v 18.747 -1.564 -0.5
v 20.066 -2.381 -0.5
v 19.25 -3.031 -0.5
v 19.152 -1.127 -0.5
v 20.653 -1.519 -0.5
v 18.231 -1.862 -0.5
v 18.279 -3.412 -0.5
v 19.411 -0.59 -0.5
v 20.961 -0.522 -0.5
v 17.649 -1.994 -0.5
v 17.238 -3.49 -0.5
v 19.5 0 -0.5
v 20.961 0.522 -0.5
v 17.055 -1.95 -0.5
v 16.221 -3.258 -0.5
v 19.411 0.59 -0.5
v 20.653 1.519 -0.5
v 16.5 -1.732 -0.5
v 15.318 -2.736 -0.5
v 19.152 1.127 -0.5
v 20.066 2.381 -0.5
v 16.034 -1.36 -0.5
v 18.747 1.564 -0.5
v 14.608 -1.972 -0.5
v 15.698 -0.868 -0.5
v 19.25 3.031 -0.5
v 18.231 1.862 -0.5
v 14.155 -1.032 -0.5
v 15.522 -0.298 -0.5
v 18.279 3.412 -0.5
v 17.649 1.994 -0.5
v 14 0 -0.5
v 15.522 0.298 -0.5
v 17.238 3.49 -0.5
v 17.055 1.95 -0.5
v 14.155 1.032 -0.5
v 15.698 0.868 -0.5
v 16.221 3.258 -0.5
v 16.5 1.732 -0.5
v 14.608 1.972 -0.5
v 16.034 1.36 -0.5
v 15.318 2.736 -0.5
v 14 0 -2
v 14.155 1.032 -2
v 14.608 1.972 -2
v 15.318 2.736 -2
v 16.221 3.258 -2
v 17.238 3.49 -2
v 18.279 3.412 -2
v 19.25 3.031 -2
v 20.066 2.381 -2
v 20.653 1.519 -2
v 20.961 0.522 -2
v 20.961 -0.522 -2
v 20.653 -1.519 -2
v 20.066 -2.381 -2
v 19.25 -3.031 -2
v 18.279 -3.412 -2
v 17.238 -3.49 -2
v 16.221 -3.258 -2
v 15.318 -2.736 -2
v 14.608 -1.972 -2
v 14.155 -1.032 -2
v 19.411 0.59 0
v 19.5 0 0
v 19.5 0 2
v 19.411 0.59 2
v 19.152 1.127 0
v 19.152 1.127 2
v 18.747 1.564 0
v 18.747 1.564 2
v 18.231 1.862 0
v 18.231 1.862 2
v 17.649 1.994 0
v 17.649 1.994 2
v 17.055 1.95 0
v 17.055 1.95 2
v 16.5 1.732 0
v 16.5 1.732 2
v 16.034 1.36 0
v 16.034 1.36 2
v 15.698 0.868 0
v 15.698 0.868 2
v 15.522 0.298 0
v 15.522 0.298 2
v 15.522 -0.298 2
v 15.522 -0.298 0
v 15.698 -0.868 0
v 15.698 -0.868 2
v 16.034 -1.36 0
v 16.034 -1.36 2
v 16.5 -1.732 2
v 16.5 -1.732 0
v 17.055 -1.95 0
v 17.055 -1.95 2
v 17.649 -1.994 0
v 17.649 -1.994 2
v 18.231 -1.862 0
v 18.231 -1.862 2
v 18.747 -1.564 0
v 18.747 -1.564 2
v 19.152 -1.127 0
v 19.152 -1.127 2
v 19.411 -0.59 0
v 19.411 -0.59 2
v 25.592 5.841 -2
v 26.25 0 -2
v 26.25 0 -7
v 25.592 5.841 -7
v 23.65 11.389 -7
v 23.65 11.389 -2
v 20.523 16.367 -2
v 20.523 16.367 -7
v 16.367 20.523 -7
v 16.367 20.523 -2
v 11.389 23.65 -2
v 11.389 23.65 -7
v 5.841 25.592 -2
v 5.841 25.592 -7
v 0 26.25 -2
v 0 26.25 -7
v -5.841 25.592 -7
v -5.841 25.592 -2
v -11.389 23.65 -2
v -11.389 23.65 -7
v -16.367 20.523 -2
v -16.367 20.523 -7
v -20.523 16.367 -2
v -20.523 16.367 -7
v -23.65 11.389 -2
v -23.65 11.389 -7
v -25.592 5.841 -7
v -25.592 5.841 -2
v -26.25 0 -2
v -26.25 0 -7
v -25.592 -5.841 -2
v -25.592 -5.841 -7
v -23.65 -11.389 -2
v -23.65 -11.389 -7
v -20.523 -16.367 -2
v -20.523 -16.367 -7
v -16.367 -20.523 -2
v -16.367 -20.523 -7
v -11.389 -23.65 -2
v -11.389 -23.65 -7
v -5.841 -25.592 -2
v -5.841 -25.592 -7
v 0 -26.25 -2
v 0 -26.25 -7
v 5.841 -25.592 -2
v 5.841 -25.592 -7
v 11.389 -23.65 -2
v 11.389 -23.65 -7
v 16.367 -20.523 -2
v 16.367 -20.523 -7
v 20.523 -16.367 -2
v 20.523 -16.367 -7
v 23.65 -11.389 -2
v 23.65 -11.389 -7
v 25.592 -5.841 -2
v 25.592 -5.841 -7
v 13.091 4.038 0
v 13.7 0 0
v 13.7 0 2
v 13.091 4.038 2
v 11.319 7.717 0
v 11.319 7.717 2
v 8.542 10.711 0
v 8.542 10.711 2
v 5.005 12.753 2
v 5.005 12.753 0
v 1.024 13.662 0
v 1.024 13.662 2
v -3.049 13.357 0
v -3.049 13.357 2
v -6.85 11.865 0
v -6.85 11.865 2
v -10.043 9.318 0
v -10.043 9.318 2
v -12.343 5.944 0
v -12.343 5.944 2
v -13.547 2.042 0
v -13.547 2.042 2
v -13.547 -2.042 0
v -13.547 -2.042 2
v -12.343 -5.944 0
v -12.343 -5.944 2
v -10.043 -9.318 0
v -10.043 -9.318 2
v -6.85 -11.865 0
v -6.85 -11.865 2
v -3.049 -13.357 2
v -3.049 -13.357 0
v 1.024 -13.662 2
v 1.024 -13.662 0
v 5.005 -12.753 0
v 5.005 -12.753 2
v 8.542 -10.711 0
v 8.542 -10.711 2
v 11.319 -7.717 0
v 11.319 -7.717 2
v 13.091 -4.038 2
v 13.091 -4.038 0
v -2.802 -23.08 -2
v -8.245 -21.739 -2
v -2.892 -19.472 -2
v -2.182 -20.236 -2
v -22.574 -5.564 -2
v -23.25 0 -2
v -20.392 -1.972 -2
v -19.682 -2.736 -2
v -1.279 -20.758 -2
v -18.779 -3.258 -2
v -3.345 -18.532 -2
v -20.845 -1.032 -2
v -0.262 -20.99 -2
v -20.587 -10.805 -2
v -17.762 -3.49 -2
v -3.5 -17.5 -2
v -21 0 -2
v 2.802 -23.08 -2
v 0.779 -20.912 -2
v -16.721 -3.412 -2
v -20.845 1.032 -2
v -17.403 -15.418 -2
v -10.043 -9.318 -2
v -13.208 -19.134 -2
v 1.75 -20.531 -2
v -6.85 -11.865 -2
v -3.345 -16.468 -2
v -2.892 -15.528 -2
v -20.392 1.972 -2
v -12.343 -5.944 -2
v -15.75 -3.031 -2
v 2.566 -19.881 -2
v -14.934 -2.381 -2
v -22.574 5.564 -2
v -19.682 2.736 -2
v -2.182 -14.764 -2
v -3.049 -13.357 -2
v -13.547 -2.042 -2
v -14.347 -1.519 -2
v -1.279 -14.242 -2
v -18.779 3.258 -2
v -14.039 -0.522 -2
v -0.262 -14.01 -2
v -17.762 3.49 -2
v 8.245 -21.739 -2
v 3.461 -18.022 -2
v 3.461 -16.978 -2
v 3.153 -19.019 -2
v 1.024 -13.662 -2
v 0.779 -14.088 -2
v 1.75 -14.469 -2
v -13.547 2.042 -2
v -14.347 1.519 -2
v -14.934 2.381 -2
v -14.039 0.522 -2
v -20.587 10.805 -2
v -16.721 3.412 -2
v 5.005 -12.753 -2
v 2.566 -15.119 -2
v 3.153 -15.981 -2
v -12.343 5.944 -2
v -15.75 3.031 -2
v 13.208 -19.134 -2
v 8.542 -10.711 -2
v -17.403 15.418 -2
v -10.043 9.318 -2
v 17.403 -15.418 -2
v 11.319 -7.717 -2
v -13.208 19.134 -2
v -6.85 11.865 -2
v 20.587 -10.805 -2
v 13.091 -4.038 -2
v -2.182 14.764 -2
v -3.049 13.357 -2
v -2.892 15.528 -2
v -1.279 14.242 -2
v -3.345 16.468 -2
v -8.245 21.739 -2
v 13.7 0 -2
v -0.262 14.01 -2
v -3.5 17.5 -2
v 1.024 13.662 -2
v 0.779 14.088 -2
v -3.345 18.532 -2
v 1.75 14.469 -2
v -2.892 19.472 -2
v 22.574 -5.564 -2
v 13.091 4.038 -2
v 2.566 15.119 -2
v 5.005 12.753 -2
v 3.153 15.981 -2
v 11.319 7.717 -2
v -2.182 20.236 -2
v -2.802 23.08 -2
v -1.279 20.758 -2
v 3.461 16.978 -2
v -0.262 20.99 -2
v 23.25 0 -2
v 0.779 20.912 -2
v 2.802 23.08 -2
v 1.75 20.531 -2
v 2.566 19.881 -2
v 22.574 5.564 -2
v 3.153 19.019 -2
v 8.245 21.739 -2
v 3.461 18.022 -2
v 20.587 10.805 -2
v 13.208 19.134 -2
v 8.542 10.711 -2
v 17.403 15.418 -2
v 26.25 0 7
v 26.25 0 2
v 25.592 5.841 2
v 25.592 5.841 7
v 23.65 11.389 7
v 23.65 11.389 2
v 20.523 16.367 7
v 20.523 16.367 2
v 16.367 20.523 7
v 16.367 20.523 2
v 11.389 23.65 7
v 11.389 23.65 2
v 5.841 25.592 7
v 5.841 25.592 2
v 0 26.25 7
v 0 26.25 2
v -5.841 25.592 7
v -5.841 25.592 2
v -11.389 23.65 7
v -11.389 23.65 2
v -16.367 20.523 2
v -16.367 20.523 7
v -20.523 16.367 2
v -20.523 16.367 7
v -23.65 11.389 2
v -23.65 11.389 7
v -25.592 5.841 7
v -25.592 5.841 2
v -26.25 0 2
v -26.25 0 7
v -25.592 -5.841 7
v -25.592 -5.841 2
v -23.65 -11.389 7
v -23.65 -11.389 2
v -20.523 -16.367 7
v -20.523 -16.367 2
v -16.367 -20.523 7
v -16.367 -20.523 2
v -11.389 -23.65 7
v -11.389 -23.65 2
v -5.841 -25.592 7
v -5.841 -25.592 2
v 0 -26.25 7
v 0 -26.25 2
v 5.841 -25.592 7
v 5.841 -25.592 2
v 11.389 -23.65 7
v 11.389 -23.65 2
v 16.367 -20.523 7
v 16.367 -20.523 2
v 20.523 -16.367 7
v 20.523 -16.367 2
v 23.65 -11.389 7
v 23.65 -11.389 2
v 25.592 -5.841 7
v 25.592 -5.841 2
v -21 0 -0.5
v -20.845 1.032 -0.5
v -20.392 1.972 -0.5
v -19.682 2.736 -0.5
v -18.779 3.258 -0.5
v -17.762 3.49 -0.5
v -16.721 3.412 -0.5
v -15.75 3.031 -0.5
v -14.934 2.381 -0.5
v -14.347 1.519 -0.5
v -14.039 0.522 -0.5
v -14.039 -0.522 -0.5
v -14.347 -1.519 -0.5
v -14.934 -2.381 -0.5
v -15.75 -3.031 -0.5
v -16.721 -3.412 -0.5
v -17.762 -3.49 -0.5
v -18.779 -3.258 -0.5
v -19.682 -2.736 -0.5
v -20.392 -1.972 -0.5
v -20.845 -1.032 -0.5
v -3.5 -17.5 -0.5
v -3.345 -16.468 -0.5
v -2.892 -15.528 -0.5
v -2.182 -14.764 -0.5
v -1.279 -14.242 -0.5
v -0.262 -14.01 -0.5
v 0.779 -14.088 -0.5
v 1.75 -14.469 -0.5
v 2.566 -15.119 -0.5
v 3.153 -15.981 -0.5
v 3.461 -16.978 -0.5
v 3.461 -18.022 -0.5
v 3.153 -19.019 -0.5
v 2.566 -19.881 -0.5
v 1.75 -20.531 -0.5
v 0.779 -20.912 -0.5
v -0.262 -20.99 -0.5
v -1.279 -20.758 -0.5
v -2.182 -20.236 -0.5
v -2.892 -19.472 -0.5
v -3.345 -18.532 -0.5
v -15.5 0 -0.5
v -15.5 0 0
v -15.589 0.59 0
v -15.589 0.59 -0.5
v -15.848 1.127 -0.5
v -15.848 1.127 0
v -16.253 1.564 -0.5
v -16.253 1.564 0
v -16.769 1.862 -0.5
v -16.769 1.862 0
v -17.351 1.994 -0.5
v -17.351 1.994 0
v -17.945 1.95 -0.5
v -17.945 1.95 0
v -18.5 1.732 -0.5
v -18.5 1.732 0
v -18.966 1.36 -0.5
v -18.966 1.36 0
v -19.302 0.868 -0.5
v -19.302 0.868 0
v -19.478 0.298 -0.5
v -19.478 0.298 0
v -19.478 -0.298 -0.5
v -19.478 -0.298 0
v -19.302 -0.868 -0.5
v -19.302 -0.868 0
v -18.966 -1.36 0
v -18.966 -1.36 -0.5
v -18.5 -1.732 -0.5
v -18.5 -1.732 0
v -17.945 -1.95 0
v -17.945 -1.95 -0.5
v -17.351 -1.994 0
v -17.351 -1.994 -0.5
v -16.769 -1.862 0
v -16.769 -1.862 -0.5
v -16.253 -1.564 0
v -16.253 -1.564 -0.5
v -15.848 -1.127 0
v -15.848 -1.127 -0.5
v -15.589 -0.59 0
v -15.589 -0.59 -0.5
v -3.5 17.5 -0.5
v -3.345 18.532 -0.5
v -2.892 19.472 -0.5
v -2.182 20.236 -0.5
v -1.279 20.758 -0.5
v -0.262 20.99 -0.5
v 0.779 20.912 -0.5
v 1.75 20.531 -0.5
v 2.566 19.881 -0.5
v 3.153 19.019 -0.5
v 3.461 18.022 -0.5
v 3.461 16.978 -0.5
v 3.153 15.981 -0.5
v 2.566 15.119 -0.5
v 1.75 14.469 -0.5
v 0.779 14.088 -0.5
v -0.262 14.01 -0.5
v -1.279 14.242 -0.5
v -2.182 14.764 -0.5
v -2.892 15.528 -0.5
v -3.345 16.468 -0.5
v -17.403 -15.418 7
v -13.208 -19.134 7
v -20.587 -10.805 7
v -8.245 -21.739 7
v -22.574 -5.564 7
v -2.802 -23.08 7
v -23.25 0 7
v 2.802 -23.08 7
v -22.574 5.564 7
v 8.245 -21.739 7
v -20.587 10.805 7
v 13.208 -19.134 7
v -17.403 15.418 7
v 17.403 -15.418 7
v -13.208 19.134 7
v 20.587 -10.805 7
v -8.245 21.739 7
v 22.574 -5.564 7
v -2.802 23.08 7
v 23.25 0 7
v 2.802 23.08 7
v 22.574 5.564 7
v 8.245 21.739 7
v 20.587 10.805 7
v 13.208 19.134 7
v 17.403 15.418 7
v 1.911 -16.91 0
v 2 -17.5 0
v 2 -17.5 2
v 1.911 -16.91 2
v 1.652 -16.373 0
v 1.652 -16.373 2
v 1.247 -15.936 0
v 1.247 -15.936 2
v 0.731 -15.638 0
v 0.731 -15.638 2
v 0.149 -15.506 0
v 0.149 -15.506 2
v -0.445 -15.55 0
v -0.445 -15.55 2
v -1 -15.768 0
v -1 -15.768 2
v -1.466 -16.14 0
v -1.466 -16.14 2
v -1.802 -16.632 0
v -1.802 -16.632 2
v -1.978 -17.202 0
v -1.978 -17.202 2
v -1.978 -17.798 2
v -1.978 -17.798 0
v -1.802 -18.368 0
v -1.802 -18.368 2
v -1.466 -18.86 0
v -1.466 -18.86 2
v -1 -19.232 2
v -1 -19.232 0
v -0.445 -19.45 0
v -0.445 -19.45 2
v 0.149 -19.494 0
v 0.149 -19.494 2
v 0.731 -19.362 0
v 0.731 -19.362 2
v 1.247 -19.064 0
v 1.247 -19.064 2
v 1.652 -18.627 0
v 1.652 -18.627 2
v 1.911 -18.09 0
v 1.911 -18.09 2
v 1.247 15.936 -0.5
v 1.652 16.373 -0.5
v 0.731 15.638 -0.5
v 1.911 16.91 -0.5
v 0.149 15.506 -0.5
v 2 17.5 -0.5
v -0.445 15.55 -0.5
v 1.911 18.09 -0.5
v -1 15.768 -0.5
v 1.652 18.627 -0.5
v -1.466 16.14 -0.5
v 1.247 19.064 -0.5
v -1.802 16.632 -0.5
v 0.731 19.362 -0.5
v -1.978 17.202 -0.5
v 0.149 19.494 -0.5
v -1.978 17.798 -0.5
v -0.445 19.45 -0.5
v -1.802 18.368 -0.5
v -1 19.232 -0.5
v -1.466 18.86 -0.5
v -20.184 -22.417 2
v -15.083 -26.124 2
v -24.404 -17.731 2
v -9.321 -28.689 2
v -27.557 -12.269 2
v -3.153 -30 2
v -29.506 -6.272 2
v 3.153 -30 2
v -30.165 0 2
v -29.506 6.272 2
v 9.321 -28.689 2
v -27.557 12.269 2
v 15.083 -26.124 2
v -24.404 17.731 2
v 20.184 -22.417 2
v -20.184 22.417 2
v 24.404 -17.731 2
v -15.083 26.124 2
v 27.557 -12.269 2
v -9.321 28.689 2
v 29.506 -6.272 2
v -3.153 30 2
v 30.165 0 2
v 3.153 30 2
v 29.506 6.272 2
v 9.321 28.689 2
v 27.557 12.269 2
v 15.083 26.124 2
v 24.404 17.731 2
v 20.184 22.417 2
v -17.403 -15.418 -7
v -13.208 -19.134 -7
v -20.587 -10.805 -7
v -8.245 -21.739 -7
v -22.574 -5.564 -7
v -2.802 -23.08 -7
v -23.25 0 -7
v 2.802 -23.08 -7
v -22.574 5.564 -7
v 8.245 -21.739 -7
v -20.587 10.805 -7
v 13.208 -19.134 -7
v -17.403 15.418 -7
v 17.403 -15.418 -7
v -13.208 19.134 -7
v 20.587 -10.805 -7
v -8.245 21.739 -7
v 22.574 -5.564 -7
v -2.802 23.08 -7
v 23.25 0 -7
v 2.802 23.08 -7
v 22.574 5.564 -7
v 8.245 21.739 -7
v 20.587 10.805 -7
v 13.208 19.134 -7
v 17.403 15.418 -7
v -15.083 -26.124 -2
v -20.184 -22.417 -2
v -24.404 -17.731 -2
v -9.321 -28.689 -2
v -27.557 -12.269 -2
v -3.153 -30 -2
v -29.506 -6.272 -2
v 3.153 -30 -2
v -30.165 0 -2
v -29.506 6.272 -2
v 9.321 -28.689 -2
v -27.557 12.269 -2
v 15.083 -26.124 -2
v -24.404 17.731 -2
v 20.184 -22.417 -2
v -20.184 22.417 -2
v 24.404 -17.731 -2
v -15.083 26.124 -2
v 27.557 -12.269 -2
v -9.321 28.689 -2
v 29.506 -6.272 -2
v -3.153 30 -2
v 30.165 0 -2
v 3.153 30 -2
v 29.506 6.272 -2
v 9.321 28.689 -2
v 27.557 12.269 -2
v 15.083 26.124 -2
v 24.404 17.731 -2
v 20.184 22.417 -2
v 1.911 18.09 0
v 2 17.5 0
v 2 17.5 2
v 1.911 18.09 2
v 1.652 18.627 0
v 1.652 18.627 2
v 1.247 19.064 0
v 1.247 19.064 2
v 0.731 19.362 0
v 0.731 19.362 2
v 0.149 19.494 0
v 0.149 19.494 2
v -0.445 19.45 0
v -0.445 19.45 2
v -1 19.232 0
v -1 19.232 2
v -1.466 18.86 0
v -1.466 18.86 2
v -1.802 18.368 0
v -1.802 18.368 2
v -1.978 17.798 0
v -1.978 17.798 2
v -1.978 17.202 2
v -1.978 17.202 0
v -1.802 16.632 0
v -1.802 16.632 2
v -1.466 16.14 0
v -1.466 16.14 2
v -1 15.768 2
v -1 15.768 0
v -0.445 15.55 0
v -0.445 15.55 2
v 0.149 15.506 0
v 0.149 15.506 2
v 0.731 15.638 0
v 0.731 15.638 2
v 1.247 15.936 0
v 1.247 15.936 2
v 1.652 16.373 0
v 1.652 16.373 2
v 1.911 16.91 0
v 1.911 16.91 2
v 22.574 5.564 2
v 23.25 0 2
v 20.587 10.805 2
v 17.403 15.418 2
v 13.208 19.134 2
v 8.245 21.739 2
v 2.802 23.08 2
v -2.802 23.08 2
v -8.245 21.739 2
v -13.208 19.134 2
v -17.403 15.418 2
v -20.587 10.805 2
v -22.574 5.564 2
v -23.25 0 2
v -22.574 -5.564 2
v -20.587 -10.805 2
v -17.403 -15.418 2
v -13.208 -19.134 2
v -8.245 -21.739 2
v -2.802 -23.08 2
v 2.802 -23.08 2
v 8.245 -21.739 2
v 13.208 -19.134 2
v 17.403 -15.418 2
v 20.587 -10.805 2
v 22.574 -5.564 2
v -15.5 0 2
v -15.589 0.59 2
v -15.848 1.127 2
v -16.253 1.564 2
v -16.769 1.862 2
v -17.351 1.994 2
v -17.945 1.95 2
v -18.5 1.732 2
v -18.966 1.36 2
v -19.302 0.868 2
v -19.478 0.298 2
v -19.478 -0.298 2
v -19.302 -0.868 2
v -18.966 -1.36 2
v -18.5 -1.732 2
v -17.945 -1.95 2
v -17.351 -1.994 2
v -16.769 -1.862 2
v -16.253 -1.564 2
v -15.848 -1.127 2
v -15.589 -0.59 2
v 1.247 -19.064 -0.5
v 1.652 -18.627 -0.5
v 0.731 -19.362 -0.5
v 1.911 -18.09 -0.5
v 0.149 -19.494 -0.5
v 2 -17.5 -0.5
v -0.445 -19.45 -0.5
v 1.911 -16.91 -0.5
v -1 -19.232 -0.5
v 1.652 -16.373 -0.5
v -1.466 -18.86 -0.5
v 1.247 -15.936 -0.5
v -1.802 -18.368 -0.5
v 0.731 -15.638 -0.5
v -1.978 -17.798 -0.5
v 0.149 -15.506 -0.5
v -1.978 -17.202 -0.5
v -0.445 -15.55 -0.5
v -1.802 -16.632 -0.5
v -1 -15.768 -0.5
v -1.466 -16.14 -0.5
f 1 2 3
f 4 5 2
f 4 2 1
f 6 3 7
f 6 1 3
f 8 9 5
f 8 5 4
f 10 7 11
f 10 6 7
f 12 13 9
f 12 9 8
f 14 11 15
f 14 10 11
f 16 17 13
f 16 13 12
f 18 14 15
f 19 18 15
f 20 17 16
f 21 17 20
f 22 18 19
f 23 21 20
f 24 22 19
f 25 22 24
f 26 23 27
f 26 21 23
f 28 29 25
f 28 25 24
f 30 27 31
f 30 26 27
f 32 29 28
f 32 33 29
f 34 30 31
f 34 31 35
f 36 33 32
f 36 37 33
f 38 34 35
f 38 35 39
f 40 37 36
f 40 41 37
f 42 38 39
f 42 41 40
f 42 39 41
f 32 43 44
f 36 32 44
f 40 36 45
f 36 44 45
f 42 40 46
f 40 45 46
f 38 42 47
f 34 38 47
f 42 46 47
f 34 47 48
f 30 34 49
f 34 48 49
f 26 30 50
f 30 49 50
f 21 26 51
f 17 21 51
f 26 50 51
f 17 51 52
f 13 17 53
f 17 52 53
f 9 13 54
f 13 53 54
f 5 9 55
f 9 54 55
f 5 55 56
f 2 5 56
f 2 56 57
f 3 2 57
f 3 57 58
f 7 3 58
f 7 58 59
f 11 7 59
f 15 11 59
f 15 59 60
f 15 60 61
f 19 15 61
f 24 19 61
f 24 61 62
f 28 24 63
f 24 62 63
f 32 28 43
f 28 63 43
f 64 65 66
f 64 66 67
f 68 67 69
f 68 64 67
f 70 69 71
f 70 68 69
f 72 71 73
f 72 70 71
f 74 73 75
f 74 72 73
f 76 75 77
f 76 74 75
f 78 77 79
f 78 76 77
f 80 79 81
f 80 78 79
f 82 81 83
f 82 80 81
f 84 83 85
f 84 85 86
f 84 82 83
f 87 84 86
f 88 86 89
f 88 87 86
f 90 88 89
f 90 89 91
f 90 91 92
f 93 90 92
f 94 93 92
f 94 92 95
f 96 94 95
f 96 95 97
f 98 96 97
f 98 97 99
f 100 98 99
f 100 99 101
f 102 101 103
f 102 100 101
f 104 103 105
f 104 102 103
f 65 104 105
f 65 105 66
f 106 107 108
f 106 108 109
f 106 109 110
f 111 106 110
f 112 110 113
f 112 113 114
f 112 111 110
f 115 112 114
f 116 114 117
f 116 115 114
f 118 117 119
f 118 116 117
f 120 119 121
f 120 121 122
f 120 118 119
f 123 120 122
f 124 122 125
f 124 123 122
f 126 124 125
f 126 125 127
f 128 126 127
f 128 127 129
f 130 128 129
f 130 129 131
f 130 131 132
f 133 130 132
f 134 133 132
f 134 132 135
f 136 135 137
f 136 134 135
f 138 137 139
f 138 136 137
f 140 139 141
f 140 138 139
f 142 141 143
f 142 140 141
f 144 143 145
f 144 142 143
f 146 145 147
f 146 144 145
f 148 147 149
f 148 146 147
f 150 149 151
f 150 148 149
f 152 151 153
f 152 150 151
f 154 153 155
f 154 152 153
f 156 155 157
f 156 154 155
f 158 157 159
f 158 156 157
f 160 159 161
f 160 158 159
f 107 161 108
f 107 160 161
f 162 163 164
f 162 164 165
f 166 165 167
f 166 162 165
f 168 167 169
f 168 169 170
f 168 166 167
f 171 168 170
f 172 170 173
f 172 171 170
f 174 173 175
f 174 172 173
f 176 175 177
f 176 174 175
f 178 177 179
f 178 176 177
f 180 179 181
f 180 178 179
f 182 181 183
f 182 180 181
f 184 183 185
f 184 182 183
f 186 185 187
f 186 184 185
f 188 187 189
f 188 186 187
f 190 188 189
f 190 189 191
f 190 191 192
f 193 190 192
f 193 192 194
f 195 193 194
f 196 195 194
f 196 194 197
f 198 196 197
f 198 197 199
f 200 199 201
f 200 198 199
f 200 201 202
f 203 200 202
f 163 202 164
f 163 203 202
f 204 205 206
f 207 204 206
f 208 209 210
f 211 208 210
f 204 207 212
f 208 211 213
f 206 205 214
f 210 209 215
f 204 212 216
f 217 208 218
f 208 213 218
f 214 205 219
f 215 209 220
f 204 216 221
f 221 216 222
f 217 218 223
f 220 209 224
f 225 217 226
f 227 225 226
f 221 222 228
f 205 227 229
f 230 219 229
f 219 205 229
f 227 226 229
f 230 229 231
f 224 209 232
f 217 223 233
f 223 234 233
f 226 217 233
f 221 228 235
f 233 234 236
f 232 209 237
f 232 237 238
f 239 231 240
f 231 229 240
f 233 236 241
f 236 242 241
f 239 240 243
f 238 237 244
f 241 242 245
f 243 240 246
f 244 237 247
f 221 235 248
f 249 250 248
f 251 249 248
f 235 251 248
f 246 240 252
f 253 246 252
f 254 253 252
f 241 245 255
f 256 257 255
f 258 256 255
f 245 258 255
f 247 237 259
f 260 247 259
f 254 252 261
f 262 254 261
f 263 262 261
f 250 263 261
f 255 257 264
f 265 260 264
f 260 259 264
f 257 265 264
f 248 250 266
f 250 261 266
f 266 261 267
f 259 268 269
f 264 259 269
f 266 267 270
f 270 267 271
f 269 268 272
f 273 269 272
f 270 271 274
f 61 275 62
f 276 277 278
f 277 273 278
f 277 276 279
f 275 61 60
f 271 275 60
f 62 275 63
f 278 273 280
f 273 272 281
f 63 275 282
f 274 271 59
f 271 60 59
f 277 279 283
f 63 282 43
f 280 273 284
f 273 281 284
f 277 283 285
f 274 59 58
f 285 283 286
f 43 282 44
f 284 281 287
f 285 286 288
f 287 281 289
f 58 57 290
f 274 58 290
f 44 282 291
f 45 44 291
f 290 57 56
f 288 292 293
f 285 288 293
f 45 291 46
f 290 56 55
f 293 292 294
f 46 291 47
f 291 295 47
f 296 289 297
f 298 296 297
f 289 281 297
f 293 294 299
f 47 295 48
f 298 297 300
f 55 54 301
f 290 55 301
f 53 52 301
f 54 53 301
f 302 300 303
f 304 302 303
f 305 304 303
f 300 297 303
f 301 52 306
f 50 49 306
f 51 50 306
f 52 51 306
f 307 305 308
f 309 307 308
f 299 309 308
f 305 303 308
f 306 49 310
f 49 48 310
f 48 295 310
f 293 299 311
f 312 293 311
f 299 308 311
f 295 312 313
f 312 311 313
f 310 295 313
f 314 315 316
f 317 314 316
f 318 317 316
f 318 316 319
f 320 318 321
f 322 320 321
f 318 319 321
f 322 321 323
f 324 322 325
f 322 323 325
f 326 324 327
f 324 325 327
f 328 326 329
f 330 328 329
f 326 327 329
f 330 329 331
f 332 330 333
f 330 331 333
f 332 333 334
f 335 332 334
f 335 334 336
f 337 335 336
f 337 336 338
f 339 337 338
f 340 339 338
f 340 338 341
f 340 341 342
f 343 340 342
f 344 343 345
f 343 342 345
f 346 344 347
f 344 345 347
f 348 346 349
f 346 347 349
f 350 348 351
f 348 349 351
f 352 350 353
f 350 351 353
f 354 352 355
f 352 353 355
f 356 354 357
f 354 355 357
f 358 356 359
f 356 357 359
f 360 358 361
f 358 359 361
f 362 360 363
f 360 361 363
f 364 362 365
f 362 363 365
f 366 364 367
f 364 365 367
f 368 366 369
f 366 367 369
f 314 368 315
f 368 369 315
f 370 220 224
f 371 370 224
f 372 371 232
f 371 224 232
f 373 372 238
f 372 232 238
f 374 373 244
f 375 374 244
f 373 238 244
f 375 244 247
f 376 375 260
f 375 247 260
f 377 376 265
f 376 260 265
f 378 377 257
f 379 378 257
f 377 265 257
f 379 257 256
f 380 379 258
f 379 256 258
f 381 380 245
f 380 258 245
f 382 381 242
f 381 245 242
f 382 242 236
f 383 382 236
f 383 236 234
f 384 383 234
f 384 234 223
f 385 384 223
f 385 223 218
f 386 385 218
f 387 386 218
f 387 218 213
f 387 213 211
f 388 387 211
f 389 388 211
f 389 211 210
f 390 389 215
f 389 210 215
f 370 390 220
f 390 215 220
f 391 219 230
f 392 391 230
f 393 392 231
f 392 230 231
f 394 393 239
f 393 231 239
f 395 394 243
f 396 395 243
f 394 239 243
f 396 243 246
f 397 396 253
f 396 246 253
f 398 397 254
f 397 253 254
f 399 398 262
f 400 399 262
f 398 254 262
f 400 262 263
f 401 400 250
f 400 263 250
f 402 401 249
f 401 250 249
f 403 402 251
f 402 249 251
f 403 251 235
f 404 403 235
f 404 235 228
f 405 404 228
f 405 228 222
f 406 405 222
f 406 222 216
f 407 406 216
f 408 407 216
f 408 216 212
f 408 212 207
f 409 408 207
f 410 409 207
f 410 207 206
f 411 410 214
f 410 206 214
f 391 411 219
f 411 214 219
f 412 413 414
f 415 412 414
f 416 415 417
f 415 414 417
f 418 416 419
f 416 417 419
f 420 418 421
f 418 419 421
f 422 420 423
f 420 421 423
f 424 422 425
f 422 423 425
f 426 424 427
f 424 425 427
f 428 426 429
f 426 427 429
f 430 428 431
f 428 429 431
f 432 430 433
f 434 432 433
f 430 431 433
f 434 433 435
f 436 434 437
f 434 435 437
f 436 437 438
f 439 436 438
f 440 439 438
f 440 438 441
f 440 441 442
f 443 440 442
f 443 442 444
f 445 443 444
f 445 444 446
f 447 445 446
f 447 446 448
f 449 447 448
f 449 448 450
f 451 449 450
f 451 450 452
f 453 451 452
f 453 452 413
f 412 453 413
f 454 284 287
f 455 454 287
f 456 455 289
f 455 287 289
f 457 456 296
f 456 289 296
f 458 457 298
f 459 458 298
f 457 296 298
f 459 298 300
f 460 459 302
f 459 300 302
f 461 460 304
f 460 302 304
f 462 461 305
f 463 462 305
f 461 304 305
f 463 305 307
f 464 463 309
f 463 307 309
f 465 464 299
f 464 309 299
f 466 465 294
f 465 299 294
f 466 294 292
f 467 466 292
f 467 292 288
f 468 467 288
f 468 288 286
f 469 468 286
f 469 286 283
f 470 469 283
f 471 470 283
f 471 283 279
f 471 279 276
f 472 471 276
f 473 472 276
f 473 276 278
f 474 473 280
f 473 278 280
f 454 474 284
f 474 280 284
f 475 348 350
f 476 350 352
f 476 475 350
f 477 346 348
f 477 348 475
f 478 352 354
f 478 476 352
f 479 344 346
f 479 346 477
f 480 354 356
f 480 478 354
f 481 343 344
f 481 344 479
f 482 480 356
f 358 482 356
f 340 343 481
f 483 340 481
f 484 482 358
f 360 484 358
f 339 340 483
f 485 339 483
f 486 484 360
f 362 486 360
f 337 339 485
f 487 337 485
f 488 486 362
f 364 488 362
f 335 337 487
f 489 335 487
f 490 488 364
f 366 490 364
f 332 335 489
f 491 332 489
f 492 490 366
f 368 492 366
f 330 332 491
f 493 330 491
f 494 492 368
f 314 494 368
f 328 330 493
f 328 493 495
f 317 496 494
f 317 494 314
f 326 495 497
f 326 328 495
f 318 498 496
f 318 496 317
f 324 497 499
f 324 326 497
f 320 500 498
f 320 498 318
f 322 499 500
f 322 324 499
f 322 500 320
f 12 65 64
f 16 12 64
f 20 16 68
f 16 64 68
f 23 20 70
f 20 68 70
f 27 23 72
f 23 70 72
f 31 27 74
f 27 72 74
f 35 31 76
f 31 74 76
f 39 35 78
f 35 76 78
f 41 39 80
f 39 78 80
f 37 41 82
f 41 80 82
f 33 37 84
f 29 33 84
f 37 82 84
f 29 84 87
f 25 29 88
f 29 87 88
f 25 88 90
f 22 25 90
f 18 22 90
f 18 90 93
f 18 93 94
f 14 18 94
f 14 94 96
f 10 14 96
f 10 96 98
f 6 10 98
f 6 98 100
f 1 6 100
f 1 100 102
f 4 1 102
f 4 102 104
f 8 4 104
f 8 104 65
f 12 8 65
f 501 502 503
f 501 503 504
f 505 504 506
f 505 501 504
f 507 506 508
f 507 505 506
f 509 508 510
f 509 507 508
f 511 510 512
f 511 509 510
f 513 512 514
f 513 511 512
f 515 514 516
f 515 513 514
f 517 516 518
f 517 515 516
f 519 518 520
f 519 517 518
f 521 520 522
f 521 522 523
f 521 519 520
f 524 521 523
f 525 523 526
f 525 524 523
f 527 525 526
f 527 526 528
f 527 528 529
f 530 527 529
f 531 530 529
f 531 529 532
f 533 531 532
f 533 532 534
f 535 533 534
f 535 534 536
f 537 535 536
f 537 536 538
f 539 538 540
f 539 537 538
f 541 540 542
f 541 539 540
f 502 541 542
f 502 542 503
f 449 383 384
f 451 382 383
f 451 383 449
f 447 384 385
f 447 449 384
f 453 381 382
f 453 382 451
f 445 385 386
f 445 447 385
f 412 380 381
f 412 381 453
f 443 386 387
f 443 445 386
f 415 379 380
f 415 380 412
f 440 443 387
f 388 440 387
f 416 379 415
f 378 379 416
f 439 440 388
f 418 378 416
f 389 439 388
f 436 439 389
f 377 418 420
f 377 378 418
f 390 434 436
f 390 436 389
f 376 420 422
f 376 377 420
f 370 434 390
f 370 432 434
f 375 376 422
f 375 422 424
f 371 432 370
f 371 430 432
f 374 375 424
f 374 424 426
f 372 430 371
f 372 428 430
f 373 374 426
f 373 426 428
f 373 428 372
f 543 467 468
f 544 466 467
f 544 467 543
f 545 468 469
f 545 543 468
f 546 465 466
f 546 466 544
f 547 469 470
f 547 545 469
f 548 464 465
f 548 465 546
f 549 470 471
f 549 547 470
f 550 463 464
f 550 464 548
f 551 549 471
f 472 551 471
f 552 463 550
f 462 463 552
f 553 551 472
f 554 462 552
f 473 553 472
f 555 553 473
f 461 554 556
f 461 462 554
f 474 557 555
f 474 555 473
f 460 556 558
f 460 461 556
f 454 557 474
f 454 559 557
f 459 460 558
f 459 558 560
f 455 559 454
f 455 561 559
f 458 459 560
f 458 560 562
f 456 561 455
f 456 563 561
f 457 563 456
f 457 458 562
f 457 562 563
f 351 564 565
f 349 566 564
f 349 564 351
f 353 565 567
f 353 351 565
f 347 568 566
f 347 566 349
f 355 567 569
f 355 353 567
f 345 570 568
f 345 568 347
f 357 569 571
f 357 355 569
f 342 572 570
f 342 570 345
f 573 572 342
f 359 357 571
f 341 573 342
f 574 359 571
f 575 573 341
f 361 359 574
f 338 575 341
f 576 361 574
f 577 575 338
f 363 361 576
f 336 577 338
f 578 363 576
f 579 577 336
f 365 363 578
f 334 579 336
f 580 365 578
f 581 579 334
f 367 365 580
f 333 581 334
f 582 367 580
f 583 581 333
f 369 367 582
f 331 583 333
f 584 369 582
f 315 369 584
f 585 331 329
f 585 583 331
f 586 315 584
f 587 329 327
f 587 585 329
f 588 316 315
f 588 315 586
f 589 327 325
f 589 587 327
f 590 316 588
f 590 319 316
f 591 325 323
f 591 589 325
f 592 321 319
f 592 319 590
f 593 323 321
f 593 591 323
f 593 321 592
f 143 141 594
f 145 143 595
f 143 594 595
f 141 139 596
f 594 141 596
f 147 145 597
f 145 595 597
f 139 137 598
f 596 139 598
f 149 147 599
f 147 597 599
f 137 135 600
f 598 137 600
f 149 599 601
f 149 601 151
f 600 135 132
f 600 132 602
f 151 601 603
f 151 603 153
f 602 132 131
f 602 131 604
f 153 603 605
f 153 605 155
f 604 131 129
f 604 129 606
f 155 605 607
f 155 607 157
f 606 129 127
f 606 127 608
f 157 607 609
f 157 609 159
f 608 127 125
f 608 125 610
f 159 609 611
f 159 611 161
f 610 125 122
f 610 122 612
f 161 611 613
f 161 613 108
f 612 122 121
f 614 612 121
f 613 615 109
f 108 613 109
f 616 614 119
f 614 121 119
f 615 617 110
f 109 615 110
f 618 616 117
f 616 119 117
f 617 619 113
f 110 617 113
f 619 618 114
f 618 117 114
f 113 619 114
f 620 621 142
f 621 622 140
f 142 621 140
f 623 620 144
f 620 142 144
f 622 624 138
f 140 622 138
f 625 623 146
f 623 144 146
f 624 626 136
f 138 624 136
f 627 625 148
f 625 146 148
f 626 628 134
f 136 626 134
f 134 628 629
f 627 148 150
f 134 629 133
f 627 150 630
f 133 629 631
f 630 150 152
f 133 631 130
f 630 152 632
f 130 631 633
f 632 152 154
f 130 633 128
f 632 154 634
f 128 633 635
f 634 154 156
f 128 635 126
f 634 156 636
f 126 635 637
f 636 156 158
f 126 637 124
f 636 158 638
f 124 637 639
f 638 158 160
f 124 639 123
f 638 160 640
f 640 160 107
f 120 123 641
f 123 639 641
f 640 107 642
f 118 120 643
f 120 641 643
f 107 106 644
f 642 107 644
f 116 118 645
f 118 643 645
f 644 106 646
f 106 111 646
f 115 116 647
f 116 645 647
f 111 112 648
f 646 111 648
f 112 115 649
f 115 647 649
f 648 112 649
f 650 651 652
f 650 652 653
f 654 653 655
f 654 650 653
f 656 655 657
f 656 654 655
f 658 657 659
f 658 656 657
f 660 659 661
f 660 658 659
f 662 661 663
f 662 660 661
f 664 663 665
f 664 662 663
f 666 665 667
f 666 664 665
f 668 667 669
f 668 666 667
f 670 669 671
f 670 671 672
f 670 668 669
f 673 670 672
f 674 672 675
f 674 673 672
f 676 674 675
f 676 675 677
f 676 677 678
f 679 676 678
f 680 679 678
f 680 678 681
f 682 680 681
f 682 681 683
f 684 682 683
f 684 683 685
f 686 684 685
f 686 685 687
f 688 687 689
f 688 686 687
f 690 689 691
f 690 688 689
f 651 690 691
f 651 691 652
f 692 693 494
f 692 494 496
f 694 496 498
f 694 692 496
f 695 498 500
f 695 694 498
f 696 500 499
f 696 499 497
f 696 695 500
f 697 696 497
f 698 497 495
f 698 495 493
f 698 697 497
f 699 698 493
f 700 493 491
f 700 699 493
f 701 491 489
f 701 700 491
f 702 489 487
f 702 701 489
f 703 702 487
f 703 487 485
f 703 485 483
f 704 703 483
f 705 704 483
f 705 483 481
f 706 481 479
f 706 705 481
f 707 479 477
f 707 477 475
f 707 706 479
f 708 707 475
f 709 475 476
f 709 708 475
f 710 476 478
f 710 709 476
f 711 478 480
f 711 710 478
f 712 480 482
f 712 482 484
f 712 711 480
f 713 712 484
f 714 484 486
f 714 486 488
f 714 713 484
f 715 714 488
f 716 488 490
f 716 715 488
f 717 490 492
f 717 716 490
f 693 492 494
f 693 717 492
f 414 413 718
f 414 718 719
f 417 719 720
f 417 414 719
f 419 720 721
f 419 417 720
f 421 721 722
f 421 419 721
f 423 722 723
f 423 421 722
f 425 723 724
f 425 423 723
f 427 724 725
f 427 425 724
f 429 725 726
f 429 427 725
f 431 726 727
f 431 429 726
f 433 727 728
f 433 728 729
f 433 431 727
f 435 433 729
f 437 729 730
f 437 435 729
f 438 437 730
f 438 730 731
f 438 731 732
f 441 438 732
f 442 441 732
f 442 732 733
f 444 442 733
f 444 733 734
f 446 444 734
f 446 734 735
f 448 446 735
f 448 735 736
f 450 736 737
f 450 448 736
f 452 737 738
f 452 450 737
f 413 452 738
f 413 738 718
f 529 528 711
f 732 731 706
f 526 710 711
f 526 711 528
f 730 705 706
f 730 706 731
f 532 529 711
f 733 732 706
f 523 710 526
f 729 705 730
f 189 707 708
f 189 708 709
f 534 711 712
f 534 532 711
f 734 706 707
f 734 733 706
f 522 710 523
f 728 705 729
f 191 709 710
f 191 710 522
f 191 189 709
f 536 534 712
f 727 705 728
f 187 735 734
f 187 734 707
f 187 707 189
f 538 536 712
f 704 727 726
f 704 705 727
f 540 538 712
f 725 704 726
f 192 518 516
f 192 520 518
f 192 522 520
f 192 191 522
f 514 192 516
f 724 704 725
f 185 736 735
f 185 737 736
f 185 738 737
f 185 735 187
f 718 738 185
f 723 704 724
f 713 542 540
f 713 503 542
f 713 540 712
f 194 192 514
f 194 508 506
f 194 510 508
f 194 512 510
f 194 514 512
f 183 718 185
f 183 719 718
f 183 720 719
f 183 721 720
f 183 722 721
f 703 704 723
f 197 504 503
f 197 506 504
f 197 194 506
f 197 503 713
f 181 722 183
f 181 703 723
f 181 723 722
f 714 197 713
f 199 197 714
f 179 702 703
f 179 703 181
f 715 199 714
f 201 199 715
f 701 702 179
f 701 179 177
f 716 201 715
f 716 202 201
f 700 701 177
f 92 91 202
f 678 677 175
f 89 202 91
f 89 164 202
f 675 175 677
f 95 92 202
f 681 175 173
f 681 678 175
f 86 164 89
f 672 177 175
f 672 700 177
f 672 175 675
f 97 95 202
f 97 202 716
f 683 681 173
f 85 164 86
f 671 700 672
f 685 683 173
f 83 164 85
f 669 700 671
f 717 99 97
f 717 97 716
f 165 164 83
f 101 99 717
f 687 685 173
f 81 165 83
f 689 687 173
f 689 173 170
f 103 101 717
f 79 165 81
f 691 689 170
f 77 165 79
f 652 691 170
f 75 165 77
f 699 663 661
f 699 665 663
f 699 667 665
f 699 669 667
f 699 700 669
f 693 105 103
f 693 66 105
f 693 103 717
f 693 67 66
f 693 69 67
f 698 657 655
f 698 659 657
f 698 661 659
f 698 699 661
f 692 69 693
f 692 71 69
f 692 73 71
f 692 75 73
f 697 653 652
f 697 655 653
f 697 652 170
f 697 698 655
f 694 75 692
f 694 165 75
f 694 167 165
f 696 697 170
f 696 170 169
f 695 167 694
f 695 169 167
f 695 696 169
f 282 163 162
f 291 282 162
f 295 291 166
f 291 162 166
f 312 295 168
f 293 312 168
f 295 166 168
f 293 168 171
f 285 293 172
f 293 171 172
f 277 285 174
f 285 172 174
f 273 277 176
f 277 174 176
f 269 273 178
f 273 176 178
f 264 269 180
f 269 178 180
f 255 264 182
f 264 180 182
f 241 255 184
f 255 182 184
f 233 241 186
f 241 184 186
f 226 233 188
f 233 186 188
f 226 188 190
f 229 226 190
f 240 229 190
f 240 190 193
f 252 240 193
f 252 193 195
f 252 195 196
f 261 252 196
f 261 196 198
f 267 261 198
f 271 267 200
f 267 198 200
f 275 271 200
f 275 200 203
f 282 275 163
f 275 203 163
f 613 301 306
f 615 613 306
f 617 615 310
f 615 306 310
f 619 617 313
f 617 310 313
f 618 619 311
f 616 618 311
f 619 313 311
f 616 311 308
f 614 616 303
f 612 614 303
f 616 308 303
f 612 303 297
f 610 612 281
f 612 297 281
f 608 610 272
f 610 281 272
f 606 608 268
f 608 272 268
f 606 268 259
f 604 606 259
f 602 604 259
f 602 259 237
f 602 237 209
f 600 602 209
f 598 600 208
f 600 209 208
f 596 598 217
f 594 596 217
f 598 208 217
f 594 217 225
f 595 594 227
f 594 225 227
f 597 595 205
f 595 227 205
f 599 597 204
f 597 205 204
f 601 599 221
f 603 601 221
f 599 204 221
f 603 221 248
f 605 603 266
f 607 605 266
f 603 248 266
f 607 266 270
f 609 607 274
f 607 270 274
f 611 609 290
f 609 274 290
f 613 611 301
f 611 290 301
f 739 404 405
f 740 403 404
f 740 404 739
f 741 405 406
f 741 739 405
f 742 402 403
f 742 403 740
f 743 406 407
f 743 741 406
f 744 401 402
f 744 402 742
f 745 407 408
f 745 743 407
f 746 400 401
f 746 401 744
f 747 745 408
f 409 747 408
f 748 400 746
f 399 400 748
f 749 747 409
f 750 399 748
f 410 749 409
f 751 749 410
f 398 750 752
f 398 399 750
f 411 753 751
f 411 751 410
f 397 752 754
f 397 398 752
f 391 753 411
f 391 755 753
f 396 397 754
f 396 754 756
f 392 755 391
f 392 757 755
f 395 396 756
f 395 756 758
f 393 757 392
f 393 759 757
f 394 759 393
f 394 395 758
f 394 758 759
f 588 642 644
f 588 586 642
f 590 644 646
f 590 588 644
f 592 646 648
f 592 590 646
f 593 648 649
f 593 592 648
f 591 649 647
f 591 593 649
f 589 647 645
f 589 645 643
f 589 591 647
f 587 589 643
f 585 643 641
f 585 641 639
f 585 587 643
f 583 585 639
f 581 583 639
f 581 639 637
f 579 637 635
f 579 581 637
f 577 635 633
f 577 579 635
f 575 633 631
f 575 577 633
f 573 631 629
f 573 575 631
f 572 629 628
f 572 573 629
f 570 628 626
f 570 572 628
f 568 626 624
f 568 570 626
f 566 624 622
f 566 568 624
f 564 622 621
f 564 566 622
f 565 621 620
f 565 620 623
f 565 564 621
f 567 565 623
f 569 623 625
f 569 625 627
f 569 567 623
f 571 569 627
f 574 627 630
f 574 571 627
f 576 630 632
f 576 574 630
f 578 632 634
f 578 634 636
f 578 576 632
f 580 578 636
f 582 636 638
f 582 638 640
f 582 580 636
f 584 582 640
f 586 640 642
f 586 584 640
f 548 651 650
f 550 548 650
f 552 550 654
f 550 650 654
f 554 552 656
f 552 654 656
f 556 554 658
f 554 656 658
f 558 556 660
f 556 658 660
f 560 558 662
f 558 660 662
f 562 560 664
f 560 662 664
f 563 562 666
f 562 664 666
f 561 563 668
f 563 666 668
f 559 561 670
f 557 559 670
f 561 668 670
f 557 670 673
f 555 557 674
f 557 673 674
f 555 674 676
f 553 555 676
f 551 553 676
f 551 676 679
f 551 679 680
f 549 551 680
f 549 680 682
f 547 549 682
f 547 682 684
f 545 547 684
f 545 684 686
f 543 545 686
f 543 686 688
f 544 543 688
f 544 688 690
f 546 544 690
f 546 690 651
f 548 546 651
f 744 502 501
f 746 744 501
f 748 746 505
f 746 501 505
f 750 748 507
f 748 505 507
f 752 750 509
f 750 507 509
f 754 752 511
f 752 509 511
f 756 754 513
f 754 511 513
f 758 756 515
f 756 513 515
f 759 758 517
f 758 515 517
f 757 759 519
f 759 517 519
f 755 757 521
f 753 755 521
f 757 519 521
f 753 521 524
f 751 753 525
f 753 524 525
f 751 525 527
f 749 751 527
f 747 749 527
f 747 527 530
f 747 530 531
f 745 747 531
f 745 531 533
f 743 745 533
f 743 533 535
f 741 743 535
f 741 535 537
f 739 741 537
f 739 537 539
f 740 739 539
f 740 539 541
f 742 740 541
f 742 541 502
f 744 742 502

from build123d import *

# Parameters (mm, degrees)
SALIENTE_EXTRUIR1_DEPTH      = 2
SALIENTE_EXTRUIR1_DEPTH_BACK = 2
CROQUIS1_R                   = 30.165
CROQUIS1_R_2                 = 13.7
CROQUIS1_R_3                 = 2
CROQUIS3_R                   = 26.25
CROQUIS3_R_2                 = 23.25
SALIENTE_EXTRUIR2_DEPTH      = 5
CROQUIS4_R                   = 3.5
CORTAR_EXTRUIR1_DEPTH        = 1.5


with BuildPart() as part:
    # Croquis1 → Saliente-Extruir1 (new, two sides: drawn at the far end of the back side and taken through both)
    with BuildSketch(Plane.XY.offset(-SALIENTE_EXTRUIR1_DEPTH_BACK)):
        Circle(CROQUIS1_R)
        Circle(CROQUIS1_R_2, mode=Mode.SUBTRACT)
        with Locations((0, 17.5)):
            Circle(CROQUIS1_R_3, mode=Mode.SUBTRACT)
        with Locations((17.5, 0)):
            Circle(CROQUIS1_R_3, mode=Mode.SUBTRACT)
        with Locations((-17.5, 0)):
            Circle(CROQUIS1_R_3, mode=Mode.SUBTRACT)
        with Locations((0, -17.5)):
            Circle(CROQUIS1_R_3, mode=Mode.SUBTRACT)
    extrude(amount=SALIENTE_EXTRUIR1_DEPTH + SALIENTE_EXTRUIR1_DEPTH_BACK)

    # Croquis3 → Saliente-Extruir2 (add)
    with BuildSketch(Plane.XY.offset(2)):
        Circle(CROQUIS3_R)
        Circle(CROQUIS3_R_2, mode=Mode.SUBTRACT)
    saliente_extruir2 = extrude(amount=SALIENTE_EXTRUIR2_DEPTH)

    # Croquis4 → Cortar-Extruir1 (cut)
    with BuildSketch(Plane(origin=(0, 0, -2), x_dir=(-1, 0, 0), z_dir=(0, 0, -1))):
        with Locations((0, 17.5)):
            Circle(CROQUIS4_R)
        with Locations((17.5, 0)):
            Circle(CROQUIS4_R)
        with Locations((-17.5, 0)):
            Circle(CROQUIS4_R)
        with Locations((0, -17.5)):
            Circle(CROQUIS4_R)
    extrude(amount=-CORTAR_EXTRUIR1_DEPTH, mode=Mode.SUBTRACT)

    # Simetría1: Saliente-Extruir2 across plane
    add(saliente_extruir2.mirror(Plane.XY))


solid = part.part
